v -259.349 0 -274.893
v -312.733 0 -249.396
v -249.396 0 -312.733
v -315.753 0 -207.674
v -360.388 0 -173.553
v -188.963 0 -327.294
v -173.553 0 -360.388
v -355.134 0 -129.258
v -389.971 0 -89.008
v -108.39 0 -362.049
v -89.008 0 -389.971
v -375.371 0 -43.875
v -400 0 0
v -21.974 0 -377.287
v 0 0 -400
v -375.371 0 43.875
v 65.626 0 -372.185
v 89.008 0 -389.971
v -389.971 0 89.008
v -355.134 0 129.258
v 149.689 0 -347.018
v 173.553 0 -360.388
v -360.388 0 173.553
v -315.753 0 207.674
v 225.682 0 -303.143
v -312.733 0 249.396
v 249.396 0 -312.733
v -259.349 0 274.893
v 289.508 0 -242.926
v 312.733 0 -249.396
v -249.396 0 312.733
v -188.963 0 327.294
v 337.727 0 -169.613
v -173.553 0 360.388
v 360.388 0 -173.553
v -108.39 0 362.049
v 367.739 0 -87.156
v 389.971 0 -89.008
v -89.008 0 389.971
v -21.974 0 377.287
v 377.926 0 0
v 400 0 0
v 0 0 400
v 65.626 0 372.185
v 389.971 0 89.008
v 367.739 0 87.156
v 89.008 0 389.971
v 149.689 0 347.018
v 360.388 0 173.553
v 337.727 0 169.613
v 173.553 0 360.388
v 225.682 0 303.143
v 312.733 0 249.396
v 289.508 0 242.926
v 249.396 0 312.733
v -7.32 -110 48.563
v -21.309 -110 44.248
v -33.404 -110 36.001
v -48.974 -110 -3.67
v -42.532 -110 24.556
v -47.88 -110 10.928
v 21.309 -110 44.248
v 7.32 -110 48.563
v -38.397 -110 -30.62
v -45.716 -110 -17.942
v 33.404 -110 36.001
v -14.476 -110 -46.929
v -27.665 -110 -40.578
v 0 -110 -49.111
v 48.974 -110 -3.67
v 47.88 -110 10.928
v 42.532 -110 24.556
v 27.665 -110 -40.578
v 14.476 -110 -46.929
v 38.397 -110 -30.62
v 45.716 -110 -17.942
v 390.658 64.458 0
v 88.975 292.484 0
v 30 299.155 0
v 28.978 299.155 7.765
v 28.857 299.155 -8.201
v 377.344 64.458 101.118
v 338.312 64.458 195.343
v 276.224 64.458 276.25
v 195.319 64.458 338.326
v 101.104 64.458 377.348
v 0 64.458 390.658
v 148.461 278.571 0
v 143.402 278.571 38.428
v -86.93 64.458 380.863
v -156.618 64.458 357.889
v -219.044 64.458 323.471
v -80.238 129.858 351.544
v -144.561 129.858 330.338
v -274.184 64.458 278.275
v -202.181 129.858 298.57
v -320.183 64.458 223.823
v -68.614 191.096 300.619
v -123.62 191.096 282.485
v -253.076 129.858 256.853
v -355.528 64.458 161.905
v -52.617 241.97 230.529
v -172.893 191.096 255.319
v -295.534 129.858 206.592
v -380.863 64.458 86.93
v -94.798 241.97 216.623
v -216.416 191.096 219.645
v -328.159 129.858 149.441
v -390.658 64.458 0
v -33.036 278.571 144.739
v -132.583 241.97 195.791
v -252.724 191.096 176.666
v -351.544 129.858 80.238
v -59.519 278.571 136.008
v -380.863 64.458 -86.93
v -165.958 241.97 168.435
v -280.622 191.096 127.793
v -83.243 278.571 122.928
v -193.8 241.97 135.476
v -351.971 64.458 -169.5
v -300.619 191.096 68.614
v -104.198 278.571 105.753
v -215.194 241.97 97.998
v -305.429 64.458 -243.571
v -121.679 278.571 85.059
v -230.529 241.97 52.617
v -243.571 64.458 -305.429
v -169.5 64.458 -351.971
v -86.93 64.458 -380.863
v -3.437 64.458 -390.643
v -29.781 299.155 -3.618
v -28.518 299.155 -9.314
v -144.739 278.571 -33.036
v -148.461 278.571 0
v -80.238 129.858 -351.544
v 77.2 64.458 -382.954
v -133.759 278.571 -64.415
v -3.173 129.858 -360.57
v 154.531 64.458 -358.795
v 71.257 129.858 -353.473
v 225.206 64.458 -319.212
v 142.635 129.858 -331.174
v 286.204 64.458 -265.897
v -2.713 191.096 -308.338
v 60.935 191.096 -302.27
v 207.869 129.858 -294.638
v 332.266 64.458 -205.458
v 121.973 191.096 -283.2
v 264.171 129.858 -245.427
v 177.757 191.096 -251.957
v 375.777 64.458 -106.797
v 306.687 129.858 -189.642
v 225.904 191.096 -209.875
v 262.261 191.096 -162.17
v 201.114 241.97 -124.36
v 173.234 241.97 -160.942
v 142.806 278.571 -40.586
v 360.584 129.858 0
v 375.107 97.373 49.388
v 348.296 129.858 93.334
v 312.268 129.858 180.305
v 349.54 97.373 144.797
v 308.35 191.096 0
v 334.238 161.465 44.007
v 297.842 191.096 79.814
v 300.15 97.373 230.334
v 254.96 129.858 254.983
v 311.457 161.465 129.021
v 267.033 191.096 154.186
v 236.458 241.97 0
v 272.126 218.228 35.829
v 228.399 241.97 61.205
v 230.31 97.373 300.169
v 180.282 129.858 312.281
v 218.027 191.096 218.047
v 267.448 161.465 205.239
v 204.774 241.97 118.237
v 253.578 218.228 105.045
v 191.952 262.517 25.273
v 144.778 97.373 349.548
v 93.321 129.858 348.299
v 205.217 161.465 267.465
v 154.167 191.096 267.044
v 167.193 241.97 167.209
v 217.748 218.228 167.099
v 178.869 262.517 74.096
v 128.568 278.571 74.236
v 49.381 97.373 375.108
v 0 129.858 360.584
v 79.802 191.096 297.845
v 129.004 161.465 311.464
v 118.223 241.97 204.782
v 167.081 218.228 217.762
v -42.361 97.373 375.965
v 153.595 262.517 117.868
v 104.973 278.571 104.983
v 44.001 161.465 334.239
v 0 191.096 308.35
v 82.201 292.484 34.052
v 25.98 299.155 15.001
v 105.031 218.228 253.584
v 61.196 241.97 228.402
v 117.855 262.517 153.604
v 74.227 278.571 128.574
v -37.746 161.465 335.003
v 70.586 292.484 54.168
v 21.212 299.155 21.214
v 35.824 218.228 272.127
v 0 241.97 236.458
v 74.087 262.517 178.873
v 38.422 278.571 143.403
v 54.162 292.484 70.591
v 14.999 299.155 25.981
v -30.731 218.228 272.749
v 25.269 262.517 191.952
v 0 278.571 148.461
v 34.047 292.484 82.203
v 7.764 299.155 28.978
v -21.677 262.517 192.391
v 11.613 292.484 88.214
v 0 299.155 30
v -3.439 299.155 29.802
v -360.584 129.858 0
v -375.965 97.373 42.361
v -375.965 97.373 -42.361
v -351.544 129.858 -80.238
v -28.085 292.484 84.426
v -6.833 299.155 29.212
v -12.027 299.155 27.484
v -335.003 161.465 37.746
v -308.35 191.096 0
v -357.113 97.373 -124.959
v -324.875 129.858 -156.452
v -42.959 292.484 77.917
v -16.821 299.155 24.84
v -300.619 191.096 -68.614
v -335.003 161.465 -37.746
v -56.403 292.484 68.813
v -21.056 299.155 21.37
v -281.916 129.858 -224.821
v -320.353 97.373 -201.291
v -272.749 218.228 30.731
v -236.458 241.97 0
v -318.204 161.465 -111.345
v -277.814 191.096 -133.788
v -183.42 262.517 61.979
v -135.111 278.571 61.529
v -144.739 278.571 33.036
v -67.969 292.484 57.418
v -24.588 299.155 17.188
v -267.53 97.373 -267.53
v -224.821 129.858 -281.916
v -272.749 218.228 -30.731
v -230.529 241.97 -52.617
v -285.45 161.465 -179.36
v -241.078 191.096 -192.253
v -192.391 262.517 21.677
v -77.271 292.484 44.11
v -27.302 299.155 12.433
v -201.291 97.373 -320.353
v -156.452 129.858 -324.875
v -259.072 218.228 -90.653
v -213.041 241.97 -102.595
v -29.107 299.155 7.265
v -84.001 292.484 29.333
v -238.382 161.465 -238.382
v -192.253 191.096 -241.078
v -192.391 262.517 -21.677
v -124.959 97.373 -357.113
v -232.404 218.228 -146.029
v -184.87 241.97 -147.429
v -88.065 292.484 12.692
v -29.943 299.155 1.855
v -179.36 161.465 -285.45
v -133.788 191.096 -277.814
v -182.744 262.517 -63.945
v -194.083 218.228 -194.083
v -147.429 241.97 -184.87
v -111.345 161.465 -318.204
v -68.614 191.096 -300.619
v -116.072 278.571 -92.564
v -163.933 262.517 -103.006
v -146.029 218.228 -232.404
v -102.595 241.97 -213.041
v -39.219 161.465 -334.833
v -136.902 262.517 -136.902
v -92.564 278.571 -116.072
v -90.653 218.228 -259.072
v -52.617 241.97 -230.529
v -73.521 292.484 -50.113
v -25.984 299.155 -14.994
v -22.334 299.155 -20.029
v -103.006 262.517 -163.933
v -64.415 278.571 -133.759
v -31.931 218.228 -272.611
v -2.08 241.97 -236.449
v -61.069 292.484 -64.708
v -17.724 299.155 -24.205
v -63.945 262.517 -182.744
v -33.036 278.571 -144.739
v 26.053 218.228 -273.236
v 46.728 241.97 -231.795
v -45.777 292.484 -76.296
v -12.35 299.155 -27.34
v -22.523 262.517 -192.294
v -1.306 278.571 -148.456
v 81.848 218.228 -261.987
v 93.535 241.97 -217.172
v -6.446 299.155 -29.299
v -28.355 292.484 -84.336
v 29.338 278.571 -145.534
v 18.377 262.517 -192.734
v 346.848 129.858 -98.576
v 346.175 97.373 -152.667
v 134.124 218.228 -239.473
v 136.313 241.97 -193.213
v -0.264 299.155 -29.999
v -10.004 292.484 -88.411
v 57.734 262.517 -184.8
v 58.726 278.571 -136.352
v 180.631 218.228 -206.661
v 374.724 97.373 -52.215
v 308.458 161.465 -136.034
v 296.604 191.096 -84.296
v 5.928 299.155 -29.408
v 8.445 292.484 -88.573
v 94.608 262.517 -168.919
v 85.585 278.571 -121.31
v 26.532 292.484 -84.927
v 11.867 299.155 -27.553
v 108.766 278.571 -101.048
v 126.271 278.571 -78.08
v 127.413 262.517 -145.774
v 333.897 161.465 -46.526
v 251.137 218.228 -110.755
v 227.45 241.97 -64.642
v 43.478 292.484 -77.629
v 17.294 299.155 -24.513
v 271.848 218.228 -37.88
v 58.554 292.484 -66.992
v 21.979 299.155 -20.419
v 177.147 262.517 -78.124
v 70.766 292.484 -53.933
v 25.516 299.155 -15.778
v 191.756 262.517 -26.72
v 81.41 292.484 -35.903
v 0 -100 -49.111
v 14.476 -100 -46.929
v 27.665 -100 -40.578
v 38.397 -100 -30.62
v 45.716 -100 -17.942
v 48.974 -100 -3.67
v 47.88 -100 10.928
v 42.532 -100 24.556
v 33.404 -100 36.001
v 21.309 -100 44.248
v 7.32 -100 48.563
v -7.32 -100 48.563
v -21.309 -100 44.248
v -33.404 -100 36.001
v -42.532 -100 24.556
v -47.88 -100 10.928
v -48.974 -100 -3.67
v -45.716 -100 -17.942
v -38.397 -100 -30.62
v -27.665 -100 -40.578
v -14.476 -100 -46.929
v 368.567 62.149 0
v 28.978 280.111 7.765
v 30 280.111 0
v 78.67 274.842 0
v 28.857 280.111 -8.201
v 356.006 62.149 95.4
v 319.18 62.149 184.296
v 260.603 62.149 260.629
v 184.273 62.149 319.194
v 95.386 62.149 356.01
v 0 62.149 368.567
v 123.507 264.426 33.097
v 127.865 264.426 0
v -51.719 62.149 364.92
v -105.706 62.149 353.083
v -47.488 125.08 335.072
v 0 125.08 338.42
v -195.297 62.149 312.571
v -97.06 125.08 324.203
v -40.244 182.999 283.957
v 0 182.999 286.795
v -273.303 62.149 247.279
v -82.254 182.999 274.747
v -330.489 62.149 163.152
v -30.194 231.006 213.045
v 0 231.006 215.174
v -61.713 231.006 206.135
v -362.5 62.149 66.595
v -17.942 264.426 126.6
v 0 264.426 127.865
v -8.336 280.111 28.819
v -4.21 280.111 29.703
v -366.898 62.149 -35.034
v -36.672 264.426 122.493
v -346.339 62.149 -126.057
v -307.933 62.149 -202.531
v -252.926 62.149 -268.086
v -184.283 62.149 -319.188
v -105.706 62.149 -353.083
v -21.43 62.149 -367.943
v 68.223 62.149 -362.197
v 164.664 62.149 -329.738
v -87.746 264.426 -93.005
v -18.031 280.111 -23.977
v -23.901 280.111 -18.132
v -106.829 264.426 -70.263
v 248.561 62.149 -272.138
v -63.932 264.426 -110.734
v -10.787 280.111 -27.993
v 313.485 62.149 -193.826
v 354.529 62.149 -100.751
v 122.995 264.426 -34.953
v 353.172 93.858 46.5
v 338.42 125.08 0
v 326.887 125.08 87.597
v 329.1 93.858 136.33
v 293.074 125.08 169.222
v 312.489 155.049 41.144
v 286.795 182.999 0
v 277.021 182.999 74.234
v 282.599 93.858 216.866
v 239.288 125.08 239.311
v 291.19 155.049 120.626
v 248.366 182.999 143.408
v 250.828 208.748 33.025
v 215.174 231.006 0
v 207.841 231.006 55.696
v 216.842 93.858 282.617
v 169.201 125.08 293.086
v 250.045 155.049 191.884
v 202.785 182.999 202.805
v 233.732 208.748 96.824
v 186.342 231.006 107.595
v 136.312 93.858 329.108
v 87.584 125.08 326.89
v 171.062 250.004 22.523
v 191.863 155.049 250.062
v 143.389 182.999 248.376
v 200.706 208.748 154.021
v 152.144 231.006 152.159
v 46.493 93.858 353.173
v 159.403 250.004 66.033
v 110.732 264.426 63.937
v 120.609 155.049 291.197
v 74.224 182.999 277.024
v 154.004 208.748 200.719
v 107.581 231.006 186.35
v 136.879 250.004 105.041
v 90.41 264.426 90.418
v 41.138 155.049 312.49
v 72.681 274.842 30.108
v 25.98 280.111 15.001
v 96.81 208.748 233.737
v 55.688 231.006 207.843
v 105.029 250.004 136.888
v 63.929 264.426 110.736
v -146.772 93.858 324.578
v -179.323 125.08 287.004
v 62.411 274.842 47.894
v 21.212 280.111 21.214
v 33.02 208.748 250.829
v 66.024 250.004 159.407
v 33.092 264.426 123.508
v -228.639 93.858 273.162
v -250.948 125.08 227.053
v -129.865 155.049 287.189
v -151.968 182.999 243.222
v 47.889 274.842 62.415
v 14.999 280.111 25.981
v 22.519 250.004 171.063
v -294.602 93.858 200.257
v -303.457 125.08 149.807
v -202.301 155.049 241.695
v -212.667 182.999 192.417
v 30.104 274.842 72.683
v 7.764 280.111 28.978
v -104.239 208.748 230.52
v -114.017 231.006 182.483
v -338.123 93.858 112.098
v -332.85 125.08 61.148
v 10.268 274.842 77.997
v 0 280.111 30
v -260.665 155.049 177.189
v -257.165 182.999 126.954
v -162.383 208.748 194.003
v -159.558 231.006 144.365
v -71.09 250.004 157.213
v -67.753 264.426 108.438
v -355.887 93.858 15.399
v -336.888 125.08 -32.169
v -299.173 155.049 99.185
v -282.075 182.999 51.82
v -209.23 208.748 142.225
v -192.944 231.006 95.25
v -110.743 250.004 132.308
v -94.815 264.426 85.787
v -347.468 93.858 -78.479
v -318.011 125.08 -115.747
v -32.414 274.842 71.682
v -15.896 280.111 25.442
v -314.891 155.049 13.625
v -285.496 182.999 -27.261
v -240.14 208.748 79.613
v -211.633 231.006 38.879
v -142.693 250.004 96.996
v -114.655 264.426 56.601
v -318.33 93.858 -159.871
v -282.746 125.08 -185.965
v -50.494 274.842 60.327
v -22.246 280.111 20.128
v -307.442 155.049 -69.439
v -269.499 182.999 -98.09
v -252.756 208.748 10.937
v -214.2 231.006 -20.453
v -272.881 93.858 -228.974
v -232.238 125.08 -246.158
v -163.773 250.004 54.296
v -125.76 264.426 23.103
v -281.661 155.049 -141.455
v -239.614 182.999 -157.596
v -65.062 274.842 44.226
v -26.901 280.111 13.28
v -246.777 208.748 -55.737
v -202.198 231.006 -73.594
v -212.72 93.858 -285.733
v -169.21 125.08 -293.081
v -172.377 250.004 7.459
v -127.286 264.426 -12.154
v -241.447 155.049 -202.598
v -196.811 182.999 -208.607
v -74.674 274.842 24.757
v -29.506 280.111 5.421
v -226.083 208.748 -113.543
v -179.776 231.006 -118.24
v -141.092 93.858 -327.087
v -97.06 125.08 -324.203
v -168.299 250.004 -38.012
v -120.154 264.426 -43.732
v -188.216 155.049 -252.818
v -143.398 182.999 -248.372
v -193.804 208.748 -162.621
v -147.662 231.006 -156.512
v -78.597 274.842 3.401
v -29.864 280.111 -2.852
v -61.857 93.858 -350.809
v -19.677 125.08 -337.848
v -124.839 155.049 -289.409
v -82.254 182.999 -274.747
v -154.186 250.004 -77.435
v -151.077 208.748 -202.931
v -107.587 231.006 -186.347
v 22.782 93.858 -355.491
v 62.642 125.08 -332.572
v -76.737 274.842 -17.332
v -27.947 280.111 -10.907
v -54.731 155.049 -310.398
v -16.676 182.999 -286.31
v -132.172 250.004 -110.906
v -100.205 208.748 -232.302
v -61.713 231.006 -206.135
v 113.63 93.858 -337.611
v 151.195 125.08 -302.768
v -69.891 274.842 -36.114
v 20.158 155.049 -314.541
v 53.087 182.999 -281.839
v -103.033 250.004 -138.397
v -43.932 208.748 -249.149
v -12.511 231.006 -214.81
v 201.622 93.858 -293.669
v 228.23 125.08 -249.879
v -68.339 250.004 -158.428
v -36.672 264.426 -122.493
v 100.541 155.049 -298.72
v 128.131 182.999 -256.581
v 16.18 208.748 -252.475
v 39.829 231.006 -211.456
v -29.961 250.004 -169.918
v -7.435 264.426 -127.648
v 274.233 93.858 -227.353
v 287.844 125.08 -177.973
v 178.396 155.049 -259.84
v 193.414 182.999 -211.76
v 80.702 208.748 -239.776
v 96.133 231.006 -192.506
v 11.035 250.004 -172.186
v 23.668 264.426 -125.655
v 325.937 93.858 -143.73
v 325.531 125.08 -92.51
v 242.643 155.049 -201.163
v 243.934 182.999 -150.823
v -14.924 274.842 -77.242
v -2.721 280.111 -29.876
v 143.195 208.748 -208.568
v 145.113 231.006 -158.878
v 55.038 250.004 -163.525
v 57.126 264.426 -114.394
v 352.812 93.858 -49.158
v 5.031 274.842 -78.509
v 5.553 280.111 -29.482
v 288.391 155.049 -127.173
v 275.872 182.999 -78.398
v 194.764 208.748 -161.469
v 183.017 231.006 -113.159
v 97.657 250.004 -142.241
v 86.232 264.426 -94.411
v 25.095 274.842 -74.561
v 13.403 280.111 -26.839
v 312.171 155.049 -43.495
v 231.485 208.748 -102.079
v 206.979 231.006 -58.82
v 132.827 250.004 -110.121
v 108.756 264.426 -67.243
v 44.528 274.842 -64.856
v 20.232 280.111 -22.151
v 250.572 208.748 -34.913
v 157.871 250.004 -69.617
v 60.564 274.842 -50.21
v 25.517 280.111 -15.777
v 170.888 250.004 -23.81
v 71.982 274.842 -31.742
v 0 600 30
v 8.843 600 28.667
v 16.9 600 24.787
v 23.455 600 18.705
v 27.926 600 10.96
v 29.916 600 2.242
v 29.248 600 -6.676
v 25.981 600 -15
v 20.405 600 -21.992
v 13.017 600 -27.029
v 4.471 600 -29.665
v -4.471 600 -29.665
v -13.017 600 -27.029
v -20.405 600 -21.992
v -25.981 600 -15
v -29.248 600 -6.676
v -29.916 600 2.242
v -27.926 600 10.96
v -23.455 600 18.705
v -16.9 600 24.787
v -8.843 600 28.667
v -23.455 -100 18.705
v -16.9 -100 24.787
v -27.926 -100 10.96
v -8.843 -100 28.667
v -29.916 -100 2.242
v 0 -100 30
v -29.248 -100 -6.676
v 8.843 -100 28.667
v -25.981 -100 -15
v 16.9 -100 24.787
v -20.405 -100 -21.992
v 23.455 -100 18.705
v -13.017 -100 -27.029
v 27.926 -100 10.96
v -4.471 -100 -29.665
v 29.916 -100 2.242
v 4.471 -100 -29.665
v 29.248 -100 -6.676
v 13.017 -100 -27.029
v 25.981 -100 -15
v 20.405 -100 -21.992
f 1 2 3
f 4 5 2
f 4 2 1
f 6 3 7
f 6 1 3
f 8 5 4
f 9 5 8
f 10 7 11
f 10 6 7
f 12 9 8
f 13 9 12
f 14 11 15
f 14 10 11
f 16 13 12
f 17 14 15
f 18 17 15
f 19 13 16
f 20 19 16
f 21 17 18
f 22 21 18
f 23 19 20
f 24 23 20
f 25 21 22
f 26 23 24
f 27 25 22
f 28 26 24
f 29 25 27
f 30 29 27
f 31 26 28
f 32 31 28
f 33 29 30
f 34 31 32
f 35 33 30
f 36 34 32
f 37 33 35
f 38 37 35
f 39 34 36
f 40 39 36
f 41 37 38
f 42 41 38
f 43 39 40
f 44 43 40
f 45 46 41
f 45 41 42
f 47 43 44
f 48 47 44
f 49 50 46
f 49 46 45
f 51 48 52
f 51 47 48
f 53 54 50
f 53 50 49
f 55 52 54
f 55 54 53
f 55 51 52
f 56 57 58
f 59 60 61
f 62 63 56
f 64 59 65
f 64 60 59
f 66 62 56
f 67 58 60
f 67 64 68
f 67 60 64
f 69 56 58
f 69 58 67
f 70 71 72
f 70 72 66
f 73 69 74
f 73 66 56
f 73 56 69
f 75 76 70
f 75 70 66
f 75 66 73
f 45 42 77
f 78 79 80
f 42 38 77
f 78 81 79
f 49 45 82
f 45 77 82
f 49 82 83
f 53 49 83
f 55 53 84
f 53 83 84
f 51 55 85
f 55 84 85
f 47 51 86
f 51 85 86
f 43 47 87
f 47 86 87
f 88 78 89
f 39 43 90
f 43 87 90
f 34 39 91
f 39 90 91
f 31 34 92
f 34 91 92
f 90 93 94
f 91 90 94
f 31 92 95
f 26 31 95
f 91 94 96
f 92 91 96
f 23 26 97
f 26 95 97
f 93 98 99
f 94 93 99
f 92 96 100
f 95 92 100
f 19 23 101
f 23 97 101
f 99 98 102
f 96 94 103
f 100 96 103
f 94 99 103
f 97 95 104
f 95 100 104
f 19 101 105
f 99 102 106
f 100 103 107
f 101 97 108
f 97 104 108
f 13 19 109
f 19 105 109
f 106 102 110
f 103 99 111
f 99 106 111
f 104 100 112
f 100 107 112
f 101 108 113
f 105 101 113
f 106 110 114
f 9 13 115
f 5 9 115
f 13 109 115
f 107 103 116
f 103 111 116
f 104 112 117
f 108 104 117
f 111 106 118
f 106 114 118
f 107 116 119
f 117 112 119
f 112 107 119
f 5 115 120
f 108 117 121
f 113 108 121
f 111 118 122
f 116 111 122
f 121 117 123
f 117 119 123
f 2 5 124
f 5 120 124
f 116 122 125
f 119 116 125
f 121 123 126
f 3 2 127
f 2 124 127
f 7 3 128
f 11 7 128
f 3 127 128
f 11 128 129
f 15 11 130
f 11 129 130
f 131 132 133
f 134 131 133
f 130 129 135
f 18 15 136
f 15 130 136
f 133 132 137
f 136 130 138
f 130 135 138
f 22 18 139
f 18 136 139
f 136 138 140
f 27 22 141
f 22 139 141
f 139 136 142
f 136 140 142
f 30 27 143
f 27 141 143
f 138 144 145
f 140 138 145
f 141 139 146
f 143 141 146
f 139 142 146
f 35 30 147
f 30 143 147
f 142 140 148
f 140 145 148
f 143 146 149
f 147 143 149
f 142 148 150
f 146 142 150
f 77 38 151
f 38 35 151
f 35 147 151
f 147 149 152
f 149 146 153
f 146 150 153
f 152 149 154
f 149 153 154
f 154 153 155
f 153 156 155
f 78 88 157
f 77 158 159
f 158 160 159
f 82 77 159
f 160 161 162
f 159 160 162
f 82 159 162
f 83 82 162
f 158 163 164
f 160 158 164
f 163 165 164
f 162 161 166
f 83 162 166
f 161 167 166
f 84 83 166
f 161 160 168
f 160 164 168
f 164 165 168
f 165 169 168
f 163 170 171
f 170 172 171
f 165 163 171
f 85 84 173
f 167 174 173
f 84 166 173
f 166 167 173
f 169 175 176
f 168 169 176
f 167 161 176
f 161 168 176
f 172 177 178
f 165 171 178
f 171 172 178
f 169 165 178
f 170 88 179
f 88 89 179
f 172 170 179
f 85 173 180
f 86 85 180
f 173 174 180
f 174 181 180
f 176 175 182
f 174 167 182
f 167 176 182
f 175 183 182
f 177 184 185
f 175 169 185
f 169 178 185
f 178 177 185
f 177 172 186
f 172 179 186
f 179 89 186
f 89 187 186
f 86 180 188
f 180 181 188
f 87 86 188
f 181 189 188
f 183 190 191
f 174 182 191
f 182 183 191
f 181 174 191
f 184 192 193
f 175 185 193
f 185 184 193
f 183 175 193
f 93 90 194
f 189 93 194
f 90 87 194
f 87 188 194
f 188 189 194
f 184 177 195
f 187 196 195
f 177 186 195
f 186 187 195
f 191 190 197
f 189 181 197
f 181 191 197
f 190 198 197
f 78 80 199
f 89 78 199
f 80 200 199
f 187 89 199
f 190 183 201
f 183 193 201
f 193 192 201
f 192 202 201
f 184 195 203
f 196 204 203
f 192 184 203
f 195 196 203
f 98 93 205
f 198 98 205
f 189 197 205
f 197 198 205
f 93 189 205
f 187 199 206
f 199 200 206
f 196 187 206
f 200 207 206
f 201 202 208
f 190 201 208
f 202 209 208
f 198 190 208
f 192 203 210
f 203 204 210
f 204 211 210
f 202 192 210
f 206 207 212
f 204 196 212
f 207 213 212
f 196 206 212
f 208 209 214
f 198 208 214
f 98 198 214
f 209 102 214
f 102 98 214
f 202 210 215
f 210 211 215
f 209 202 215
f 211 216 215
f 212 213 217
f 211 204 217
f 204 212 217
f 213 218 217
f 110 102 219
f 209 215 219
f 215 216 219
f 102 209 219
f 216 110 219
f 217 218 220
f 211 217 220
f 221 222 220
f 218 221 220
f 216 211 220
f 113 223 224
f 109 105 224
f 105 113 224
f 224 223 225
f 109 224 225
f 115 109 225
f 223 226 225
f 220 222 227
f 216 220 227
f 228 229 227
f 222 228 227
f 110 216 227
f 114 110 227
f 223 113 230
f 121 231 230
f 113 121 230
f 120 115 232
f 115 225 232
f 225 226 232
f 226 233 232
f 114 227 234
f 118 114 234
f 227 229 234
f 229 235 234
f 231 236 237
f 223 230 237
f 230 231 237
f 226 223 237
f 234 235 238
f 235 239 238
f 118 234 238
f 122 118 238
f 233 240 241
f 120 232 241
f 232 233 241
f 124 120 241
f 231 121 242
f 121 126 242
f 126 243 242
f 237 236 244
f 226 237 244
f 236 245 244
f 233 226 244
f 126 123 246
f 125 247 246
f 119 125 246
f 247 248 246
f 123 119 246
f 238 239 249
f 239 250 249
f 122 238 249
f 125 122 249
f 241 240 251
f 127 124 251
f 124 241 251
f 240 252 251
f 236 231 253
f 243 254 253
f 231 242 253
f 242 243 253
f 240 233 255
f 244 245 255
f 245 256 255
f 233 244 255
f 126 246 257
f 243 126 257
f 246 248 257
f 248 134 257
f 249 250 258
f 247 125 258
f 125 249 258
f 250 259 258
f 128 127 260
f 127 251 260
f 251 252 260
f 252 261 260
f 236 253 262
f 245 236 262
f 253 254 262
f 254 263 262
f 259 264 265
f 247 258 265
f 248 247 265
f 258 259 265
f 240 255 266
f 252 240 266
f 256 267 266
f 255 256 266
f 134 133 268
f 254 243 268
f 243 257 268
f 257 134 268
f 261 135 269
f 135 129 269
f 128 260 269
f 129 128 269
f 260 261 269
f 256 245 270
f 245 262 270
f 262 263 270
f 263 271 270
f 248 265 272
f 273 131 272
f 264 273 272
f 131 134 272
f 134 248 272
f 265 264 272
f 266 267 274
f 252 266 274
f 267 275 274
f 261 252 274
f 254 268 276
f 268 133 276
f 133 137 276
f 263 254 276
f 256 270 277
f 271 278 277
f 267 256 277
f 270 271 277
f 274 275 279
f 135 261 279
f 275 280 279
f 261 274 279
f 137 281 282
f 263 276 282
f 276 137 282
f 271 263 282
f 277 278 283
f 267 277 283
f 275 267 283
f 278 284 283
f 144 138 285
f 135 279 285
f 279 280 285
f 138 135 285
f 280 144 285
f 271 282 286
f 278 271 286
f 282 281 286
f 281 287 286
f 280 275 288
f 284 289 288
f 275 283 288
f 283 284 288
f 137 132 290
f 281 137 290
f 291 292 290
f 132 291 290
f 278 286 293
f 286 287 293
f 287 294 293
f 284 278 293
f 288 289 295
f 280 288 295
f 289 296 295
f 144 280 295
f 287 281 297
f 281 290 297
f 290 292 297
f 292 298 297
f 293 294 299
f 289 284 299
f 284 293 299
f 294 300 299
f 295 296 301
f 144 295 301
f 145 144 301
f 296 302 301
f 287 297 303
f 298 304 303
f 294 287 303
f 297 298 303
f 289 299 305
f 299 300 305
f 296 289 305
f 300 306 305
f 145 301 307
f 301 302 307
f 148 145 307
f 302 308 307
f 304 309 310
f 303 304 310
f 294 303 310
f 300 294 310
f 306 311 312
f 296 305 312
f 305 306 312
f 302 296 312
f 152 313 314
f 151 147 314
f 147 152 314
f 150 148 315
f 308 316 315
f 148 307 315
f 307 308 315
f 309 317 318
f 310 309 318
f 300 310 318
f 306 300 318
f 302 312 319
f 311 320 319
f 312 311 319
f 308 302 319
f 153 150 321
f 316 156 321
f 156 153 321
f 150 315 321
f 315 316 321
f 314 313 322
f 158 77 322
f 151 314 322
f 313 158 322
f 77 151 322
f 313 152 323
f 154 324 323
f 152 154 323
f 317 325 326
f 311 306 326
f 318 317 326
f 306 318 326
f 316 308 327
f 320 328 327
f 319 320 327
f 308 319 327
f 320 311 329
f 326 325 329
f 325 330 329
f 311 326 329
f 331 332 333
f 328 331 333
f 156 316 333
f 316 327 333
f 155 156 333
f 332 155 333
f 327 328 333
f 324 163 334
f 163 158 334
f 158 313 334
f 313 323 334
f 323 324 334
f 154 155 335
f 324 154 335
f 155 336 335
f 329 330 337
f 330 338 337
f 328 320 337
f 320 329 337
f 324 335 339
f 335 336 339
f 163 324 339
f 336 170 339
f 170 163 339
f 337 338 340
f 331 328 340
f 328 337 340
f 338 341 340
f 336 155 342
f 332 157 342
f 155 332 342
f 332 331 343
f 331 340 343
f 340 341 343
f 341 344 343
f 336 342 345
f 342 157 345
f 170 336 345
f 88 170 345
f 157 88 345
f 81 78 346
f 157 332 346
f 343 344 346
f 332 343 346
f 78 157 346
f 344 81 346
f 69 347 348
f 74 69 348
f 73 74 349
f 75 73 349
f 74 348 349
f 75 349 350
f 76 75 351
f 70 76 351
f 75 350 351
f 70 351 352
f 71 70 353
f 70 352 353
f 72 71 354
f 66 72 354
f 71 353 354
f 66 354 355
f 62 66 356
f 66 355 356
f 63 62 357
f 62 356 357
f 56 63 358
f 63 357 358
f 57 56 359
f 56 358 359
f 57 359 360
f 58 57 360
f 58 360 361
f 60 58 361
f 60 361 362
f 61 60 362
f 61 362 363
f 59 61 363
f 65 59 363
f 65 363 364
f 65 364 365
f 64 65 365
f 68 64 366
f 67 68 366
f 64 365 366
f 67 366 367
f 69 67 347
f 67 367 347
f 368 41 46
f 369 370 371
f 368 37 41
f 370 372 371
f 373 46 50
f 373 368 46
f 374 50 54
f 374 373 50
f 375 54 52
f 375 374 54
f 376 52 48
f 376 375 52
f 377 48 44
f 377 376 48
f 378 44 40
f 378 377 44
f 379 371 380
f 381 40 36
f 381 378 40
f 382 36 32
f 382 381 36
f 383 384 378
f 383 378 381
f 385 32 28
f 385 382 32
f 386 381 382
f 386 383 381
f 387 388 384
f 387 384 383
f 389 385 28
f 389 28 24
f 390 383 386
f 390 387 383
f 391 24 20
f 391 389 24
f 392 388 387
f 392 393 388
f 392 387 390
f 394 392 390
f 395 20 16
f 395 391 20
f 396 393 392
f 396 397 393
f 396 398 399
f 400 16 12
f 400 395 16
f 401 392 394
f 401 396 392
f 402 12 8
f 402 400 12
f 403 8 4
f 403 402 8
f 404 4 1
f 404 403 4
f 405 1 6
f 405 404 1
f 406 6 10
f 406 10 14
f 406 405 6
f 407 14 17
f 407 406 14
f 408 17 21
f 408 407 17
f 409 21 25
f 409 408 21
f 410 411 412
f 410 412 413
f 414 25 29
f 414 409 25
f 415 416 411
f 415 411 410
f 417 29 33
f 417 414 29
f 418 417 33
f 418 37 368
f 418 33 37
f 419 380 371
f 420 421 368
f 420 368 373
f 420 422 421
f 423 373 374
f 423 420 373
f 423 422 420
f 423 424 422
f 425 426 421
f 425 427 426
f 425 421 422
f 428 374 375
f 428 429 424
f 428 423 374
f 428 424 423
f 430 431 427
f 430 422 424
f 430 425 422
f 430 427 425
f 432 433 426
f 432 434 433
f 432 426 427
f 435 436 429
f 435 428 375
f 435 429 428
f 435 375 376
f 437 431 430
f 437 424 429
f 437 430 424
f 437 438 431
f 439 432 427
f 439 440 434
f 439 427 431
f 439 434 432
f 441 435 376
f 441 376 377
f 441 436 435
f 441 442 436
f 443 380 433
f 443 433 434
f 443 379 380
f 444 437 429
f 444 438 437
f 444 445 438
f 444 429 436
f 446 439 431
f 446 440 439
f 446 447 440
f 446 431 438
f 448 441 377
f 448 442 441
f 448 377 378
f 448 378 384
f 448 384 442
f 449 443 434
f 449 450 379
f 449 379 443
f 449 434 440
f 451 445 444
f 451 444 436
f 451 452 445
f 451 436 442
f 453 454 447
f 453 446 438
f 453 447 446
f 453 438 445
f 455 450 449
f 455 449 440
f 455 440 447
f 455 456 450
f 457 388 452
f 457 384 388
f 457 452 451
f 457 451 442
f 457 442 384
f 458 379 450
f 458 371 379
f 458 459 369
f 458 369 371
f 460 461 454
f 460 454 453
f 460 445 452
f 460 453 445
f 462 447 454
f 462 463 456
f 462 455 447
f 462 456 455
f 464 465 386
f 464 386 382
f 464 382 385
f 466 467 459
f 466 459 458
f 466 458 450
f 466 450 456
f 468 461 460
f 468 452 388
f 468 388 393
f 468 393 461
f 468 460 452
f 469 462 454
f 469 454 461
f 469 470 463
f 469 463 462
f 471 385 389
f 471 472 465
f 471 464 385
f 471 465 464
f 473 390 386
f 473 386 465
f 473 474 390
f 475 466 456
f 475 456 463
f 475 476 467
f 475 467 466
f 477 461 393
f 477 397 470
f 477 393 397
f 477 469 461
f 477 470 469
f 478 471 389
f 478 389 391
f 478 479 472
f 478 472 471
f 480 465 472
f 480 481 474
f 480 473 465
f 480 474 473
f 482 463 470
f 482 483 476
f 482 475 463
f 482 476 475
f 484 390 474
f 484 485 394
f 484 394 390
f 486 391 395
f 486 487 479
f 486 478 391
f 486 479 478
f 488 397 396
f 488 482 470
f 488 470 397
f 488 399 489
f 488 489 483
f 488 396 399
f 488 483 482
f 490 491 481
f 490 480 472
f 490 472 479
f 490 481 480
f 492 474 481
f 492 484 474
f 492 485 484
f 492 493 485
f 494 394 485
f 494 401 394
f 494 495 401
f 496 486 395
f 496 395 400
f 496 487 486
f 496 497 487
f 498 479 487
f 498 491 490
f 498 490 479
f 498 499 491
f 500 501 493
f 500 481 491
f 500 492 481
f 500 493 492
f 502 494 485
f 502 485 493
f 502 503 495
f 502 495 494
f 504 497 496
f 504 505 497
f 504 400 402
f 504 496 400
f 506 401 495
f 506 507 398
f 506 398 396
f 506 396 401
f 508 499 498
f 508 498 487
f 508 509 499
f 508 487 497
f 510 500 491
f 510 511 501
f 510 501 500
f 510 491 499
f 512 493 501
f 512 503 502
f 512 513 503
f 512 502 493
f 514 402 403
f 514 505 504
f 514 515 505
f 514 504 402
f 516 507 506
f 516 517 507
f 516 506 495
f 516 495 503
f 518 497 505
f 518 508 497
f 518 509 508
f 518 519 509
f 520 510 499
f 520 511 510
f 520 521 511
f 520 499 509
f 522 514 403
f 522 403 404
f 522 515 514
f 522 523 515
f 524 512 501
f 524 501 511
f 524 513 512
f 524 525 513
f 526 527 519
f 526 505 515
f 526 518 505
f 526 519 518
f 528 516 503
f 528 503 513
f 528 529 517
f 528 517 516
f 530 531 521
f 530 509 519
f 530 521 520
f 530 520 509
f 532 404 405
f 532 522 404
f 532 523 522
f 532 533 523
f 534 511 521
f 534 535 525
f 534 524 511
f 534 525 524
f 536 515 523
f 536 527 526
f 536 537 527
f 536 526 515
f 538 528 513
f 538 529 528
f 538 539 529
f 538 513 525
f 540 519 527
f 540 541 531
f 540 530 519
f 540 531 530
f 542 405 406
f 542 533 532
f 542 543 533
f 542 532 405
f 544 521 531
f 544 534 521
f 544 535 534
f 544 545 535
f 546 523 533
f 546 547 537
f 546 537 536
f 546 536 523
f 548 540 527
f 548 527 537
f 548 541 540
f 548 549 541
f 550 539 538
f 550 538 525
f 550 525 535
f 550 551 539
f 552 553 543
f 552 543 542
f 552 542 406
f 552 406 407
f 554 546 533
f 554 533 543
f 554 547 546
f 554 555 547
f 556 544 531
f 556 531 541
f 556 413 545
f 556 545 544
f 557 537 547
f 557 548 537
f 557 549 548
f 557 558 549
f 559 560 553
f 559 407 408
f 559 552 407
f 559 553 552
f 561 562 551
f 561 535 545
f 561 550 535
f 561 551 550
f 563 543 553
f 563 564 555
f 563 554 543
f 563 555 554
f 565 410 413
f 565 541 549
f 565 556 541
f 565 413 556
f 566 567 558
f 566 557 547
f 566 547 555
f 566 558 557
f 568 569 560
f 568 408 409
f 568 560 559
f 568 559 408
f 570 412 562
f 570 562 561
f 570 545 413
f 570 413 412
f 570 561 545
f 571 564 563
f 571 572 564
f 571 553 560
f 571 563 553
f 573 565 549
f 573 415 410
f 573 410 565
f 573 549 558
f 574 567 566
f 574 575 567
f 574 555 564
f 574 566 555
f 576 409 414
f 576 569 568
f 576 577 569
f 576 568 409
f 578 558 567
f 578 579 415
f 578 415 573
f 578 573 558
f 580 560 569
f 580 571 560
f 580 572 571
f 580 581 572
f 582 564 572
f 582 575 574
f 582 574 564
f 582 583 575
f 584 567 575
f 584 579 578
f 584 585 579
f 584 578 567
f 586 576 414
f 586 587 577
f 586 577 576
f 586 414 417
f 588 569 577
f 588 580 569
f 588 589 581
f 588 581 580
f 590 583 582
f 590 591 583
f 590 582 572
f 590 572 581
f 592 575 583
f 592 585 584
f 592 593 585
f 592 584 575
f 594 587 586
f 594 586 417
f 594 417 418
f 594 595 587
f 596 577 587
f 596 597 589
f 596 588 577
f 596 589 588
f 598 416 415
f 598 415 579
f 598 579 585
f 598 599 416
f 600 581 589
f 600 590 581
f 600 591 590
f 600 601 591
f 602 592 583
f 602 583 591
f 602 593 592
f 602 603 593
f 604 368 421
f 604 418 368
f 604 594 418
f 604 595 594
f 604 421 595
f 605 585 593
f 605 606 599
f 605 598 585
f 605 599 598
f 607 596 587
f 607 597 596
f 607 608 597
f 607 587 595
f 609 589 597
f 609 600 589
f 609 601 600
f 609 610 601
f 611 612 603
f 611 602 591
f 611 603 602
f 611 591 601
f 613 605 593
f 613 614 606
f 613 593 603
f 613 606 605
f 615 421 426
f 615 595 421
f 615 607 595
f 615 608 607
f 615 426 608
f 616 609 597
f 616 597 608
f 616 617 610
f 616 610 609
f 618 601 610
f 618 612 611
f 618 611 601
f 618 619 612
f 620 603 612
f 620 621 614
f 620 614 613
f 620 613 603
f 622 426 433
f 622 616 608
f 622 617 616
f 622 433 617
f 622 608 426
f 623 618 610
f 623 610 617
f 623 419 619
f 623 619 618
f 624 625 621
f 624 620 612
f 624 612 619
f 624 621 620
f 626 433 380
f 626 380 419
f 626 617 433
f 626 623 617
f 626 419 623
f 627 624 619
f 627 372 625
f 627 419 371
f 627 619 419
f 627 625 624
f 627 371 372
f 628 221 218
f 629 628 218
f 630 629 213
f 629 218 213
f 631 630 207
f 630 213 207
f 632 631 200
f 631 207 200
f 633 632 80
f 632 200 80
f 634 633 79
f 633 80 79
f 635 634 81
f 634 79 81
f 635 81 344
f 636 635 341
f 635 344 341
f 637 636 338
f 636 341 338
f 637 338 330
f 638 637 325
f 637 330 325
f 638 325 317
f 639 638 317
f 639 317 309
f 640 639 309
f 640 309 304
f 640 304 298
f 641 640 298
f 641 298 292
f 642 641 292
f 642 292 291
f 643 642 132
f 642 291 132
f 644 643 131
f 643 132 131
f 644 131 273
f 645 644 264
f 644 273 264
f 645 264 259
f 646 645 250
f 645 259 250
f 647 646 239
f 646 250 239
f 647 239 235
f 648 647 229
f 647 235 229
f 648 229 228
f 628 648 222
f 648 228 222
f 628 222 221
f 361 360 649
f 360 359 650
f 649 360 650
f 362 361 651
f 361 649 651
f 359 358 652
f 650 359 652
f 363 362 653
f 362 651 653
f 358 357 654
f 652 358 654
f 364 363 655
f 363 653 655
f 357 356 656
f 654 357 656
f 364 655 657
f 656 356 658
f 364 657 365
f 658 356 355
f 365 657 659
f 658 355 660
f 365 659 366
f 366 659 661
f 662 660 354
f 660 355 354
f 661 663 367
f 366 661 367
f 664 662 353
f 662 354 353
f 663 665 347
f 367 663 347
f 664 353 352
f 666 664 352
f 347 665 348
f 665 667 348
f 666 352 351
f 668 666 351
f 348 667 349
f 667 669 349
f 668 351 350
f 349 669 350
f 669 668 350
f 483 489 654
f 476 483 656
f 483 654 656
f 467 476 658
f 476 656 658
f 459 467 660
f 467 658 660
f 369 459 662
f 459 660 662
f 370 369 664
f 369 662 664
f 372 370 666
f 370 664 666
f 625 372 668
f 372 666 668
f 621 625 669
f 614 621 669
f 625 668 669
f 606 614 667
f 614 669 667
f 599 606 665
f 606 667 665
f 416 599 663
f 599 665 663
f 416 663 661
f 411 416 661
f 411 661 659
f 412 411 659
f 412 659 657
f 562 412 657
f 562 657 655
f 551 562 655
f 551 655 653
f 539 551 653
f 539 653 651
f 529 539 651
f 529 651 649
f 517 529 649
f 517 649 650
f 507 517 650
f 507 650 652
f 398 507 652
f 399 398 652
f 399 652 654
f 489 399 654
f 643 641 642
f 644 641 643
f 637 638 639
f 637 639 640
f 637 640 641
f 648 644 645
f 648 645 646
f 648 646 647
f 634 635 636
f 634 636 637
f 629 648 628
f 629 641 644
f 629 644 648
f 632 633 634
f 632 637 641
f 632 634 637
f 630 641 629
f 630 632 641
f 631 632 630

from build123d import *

# Parameters (mm, degrees)
ESTRUSIONE_ESTRUSIONE1_DEPTH      = 600
ESTRUSIONE_ESTRUSIONE1_DEPTH_BACK = 100
SCHIZZO6_R                        = 30
SCHIZZO7_R                        = 49.111274452
ESTRUSIONE_ESTRUSIONE2_DEPTH      = 10


with BuildPart() as part:
    # Schizzo1 → Rivoluzione2 (revolve)
    with BuildSketch(Plane.XY):
        with BuildLine():
            Line((0, 280.99750454), (0, 300))
            add(Edge.make_bspline(
                [(400, 0), (400, 300), (0, 300)],
                knots=[0, 0, 0, 1.570796327, 1.570796327, 1.570796327], degree=2, weights=[1, 0.707106781, 1]))
            Line((400, 0), (377.926101554, 0))
            add(Edge.make_bspline(
                [(377.926101554, 0), (377.926101554, 280.99750454), (0, 280.99750454)],
                knots=[0, 0, 0, 1.570796327, 1.570796327, 1.570796327], degree=2, weights=[1, 0.707106781, 1]))
        make_face()
    revolve(axis=Axis((0, 300, 0), (0, -1, 0)))

    # Schizzo6 → Estrusione-Estrusione1 (add, two sides: drawn at the far end of the back side and taken through both)
    with BuildSketch(Plane(origin=(0, 0, 0), x_dir=(1, 0, 0), z_dir=(0, 1, 0)).offset(-ESTRUSIONE_ESTRUSIONE1_DEPTH_BACK)):
        with Locations(Location((0, 0, 0), (0, 0, 270))):
            Circle(SCHIZZO6_R)
    extrude(amount=ESTRUSIONE_ESTRUSIONE1_DEPTH + ESTRUSIONE_ESTRUSIONE1_DEPTH_BACK)

    # Schizzo7 → Estrusione-Estrusione2 (add)
    with BuildSketch(Plane.XZ.offset(100)):
        with Locations(Location((0, 0, 0), (0, 0, 270))):
            Circle(SCHIZZO7_R)
    extrude(amount=ESTRUSIONE_ESTRUSIONE2_DEPTH)


solid = part.part
